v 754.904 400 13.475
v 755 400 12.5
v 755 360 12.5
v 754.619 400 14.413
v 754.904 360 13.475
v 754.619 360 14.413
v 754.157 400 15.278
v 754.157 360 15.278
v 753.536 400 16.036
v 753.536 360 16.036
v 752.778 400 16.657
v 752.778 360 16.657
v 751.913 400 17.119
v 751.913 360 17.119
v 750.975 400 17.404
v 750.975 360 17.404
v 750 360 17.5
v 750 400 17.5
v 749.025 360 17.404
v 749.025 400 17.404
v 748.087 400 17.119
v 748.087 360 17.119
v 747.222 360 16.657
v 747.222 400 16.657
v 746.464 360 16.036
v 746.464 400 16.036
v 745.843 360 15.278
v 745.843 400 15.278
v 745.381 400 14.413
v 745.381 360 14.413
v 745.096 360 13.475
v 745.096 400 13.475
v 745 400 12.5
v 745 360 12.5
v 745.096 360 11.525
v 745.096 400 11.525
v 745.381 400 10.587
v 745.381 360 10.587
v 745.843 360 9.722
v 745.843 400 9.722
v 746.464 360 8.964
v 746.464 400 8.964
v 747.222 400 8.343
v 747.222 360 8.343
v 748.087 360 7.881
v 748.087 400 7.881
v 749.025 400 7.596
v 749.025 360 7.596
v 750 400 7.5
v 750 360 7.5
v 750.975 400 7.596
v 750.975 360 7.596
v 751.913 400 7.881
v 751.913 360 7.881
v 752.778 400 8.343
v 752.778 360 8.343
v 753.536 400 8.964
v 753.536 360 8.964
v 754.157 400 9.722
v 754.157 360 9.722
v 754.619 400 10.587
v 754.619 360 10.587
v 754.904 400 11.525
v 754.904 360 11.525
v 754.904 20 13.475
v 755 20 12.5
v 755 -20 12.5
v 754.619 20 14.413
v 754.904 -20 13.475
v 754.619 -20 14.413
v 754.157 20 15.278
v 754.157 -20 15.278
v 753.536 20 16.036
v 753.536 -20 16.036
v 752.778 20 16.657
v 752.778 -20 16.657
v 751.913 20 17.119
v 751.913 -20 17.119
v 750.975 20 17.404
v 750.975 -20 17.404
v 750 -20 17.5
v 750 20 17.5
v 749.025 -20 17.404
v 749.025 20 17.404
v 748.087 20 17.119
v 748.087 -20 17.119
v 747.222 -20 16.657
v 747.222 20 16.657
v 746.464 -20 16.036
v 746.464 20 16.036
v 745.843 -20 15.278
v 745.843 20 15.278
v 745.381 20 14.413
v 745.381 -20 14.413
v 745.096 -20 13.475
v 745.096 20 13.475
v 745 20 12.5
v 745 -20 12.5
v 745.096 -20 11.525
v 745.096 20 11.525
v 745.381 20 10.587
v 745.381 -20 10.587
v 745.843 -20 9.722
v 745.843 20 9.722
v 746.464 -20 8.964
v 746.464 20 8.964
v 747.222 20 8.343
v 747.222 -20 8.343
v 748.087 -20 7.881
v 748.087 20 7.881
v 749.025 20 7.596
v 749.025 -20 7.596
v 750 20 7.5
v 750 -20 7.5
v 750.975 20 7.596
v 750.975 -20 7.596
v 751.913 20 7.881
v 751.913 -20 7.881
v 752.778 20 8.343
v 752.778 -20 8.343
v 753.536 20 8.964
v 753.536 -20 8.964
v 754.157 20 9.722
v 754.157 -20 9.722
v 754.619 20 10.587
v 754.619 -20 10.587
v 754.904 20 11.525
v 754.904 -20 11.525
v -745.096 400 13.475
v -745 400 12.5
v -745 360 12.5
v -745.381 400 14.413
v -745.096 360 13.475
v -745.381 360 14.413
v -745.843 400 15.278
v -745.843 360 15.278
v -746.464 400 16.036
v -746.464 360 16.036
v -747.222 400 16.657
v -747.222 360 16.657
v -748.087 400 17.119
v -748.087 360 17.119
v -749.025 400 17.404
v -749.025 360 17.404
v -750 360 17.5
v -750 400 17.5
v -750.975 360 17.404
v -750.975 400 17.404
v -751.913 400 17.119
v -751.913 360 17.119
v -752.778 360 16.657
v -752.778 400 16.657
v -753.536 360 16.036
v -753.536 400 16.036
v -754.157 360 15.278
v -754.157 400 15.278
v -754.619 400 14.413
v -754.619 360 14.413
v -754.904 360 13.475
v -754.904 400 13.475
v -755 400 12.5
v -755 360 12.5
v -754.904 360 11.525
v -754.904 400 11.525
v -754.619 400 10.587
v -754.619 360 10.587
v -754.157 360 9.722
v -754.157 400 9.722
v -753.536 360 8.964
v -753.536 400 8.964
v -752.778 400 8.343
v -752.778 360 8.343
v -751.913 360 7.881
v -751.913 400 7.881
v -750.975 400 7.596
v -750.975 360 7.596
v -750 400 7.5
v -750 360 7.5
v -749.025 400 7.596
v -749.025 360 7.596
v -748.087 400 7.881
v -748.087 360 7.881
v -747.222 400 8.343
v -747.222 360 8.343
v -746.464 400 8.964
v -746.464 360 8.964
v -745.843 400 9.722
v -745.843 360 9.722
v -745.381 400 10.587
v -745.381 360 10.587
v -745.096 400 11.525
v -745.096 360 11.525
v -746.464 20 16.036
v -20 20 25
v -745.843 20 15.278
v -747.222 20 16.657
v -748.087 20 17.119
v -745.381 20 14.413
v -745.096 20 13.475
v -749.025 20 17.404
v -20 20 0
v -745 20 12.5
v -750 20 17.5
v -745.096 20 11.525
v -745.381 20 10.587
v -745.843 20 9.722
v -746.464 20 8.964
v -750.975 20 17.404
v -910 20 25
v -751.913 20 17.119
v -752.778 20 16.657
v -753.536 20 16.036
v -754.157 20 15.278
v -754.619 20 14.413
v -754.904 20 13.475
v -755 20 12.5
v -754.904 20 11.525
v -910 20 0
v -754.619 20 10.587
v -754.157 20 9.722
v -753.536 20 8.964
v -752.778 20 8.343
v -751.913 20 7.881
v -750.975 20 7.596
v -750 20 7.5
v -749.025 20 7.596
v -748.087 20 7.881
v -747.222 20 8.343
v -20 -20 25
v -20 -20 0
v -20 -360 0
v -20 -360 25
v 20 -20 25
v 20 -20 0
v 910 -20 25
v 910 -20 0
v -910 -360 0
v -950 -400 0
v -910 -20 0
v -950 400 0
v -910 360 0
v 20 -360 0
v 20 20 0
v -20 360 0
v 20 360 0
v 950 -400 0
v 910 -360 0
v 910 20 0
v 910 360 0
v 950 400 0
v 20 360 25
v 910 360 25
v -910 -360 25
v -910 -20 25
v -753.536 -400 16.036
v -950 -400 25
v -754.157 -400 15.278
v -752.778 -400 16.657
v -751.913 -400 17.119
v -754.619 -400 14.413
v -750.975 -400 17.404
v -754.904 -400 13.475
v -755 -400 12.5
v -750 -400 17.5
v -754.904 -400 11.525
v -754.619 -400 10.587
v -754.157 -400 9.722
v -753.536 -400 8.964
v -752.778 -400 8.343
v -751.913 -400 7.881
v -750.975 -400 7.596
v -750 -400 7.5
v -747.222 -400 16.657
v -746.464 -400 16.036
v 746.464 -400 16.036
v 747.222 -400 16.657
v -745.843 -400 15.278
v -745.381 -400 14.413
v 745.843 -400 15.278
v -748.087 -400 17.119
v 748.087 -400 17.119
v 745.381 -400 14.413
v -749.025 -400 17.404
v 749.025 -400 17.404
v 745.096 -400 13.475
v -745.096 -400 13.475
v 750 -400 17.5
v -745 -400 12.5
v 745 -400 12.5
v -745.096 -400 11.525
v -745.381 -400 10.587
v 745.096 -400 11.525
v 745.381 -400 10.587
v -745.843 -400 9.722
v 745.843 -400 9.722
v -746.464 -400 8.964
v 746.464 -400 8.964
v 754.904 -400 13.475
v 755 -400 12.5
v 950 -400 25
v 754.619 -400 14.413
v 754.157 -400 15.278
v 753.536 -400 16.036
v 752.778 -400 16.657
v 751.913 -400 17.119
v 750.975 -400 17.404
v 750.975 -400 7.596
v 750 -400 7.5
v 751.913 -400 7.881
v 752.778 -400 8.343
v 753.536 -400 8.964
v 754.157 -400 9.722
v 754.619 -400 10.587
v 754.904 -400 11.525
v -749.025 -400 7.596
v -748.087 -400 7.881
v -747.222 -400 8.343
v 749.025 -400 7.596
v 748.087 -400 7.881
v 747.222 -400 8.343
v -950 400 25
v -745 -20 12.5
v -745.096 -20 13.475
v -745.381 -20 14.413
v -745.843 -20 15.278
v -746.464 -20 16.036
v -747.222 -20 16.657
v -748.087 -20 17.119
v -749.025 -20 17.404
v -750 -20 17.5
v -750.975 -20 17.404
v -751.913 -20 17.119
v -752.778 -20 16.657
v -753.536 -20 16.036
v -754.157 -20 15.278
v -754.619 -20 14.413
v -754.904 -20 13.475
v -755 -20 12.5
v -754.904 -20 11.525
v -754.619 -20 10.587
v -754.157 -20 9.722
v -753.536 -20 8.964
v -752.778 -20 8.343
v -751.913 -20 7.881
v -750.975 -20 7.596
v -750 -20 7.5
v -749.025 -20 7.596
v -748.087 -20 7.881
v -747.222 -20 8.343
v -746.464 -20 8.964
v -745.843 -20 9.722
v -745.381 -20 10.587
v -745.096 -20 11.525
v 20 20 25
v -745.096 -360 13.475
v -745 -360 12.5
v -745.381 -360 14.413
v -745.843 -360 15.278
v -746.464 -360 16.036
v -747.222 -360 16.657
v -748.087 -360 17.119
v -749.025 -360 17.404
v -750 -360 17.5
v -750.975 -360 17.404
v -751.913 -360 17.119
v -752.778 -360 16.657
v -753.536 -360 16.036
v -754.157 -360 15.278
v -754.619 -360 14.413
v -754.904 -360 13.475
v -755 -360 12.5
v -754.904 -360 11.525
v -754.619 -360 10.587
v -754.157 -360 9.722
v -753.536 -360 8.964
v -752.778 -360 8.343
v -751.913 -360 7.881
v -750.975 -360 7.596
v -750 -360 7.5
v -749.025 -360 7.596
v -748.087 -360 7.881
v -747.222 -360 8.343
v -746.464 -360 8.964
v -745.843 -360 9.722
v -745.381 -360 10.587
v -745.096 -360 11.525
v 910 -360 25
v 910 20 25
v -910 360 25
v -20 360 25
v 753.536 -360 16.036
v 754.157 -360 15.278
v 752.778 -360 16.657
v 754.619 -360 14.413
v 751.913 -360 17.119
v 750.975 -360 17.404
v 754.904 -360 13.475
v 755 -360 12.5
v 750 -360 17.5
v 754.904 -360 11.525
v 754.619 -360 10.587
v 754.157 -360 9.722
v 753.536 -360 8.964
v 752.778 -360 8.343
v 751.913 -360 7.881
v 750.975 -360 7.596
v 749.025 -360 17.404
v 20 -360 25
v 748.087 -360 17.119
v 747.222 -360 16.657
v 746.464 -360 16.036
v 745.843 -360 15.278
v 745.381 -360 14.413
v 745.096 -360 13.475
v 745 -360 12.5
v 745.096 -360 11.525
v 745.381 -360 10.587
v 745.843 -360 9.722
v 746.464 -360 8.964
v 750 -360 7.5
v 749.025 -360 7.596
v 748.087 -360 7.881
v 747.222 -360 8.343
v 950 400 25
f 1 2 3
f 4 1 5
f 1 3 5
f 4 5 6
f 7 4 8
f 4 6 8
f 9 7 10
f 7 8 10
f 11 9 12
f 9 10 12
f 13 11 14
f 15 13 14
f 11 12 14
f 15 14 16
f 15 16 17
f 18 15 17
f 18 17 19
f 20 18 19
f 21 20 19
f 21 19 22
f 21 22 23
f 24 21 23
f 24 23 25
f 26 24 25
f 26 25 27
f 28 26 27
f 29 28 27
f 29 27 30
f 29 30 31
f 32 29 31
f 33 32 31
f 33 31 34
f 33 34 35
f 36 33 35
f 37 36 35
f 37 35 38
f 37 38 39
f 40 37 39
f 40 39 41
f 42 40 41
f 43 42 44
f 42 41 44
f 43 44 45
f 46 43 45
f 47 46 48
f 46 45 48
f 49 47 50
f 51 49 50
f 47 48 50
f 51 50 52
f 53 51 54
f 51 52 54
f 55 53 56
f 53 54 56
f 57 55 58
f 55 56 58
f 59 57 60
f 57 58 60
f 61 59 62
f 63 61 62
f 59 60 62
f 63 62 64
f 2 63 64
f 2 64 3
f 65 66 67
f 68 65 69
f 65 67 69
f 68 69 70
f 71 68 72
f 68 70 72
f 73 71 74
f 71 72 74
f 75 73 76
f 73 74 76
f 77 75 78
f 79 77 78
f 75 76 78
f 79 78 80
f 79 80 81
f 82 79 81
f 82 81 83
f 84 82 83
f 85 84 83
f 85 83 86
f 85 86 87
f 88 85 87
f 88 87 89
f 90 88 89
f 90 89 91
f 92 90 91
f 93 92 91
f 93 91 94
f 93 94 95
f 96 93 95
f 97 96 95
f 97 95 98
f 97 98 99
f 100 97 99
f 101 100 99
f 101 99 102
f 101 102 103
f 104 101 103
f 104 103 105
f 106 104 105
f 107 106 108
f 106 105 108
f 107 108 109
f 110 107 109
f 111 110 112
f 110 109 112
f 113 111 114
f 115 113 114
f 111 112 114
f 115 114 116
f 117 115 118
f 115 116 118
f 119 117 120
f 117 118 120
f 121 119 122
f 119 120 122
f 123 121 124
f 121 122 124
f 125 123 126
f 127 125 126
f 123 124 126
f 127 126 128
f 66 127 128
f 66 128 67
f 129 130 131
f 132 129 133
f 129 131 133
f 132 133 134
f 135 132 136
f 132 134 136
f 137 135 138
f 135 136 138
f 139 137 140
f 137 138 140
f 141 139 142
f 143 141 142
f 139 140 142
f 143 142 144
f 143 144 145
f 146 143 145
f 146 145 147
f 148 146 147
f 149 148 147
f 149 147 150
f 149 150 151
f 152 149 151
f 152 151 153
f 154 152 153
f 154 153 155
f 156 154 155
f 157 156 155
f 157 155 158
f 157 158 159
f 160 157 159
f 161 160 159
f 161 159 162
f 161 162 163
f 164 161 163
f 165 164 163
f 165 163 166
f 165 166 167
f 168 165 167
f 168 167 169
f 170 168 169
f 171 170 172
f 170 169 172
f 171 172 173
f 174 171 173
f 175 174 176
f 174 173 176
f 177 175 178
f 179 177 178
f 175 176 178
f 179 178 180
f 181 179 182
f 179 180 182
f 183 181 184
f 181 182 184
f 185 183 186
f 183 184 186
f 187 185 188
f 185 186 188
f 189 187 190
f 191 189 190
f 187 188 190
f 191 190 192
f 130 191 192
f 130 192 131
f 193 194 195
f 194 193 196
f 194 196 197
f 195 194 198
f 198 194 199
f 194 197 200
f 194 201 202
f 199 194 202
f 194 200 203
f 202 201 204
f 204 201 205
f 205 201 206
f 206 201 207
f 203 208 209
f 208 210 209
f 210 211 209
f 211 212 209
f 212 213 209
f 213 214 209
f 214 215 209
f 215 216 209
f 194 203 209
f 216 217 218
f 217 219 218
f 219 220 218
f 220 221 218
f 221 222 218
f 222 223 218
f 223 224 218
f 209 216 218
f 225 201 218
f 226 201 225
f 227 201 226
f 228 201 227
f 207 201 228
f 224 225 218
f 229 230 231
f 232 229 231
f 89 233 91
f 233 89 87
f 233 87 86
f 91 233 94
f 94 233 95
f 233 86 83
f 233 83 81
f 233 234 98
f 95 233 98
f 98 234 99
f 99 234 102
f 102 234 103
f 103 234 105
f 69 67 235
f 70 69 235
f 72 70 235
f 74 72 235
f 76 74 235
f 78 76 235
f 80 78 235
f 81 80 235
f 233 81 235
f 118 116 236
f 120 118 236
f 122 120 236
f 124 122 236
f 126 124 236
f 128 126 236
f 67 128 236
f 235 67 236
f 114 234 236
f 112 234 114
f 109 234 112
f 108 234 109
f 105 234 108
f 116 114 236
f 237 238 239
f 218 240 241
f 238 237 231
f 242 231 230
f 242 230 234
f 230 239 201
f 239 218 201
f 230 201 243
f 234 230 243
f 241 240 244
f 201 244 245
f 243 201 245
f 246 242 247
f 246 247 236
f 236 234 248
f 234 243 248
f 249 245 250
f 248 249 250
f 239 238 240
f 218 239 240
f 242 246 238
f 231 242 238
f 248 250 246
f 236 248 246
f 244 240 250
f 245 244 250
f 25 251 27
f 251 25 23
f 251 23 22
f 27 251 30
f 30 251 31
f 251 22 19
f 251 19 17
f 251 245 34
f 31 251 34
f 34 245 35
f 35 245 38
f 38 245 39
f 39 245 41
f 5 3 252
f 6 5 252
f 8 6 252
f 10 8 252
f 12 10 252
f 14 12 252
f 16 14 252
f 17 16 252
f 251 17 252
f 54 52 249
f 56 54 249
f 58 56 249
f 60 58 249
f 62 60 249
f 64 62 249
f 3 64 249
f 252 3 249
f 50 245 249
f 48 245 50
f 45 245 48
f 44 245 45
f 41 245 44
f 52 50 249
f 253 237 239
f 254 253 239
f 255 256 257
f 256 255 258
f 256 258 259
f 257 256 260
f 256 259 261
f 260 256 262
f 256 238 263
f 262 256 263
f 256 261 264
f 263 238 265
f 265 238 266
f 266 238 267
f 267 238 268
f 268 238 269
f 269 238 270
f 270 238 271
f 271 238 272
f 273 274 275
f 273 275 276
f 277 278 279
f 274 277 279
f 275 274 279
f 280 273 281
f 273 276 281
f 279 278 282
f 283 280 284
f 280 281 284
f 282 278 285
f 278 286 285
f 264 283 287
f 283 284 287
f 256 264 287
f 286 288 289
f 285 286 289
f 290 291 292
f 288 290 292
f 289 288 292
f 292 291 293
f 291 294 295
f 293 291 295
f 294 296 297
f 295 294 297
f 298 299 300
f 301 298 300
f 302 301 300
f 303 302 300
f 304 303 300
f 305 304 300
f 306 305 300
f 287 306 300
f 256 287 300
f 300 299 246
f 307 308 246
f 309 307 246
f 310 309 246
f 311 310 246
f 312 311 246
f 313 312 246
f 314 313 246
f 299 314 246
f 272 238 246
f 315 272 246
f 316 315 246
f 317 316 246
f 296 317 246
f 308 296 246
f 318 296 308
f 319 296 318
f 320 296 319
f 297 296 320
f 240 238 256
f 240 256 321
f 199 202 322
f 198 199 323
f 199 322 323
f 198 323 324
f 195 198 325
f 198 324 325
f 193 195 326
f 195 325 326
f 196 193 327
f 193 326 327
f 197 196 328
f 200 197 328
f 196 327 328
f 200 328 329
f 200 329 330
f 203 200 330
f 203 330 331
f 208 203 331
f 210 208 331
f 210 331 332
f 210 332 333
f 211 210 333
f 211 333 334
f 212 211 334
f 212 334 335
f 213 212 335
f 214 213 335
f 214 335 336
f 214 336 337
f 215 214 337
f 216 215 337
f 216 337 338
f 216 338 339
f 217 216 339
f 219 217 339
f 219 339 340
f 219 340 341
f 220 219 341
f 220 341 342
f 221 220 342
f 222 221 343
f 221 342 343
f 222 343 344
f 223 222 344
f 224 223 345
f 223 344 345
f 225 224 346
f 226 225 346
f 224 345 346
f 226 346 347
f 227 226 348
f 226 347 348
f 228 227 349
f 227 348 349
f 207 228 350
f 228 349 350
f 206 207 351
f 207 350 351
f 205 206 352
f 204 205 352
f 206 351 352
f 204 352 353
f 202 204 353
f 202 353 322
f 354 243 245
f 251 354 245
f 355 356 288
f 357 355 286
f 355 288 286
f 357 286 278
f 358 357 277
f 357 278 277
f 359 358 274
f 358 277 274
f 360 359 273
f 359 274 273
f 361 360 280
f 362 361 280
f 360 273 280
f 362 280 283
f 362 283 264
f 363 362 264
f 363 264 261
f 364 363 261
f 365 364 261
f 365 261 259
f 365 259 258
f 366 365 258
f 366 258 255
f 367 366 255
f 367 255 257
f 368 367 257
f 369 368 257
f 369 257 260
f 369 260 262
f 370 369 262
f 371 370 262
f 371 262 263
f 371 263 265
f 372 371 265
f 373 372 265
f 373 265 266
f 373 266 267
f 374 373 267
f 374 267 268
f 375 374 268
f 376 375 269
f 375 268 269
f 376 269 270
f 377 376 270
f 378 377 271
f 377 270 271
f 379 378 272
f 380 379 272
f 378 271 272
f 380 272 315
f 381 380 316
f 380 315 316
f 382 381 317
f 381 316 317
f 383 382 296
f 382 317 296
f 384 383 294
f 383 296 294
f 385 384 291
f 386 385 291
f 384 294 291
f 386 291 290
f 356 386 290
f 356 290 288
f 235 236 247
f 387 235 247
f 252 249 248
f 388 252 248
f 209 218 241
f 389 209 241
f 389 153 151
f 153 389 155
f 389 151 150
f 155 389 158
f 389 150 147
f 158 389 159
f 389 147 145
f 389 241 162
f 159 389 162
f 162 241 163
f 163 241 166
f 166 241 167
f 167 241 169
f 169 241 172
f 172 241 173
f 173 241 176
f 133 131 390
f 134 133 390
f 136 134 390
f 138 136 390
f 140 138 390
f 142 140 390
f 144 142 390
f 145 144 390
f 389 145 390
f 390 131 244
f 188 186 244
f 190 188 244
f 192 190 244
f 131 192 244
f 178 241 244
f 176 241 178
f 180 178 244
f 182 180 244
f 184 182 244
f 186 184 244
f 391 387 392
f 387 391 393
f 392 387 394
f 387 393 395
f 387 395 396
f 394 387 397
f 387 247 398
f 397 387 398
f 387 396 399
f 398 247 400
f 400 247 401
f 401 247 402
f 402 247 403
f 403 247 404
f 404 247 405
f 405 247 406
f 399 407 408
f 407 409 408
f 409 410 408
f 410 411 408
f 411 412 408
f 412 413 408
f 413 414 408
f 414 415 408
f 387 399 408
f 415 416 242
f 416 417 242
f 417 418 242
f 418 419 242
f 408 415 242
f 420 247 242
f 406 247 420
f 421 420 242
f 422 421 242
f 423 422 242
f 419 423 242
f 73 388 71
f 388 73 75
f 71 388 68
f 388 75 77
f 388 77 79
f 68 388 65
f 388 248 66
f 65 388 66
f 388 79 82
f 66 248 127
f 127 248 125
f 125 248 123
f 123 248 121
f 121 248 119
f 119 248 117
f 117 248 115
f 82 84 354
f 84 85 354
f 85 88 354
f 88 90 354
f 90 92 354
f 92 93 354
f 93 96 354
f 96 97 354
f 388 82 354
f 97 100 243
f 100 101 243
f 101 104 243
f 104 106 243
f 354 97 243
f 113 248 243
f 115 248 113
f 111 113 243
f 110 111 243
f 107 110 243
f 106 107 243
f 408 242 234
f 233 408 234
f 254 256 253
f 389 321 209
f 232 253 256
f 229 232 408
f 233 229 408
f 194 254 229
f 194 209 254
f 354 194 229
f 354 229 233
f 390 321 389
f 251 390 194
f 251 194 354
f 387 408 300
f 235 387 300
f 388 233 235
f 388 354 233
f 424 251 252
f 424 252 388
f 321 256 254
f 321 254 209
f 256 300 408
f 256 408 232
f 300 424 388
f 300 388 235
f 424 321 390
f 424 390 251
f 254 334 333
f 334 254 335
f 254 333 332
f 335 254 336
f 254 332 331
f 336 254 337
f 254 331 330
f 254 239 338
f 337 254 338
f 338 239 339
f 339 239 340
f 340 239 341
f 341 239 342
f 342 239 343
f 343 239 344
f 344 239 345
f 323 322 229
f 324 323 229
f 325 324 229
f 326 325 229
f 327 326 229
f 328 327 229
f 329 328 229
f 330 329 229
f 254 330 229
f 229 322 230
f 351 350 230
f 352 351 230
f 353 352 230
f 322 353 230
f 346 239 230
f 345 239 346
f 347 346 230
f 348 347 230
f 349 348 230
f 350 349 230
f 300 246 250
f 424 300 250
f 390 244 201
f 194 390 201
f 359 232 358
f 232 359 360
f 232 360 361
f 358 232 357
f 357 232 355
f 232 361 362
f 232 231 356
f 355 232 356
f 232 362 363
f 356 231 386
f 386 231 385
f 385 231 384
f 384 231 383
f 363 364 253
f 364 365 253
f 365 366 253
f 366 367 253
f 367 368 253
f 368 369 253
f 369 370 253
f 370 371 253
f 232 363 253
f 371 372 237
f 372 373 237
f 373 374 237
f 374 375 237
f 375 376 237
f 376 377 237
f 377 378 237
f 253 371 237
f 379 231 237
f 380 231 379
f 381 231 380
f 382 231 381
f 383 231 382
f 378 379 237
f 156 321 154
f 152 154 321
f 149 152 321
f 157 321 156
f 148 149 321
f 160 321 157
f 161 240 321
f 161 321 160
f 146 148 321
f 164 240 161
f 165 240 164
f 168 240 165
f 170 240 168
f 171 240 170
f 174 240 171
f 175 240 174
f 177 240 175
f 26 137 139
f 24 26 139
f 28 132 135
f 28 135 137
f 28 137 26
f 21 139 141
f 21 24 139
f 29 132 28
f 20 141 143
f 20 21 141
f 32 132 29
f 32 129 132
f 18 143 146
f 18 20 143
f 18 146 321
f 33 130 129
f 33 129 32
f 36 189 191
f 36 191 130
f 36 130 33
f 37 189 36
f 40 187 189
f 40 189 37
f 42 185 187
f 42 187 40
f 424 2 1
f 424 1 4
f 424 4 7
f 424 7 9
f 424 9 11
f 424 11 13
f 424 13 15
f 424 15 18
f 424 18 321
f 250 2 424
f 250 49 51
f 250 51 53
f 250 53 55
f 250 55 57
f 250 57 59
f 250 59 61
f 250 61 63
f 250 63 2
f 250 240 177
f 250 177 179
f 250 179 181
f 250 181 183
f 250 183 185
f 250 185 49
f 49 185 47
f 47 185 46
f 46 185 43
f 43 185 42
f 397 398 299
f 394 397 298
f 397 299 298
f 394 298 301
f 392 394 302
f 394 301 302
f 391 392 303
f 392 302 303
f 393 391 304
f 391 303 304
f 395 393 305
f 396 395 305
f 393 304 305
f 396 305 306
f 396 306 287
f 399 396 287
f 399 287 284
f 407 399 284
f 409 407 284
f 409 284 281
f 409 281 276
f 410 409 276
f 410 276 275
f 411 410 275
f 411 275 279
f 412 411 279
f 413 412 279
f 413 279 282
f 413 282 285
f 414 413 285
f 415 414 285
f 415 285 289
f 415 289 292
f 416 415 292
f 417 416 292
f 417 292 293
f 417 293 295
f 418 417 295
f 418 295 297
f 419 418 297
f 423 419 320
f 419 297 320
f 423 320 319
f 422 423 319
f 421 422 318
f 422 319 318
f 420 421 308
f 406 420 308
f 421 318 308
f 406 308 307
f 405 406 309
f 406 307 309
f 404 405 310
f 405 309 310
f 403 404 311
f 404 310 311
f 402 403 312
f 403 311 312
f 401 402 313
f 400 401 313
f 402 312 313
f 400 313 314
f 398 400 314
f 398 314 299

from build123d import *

# Parameters (mm, degrees)
F0_W     = 1900
F0_H     = 800
F1_DEPTH = 25
F2_R     = 5
F3_DEPTH = 800.001


with BuildPart() as f1:
    # F0 (on Top) → F1 (new body)
    with BuildSketch(Plane.XY):
        Rectangle(F0_W, F0_H)
        Polygon((20, 360), (910, 360), (910, 20), (910, -20), (910, -360), (20, -360), (-20, -360), (-910, -360), (-910, -20), (-910, 20), (-910, 360), (-20, 360), align=None, mode=Mode.SUBTRACT)
        Polygon((20, 20), (20, 360), (-20, 360), (-20, 20), (-910, 20), (-910, -20), (-20, -20), (-20, -360), (20, -360), (20, -20), (910, -20), (910, 20), align=None)
    extrude(amount=F1_DEPTH)

    # F2 (on face) → F3 (cut, through all)
    with BuildSketch(Plane.XZ.offset(400)):
        with Locations((750, 12.5)):
            Circle(F2_R)
        with Locations((-750, 12.5)):
            Circle(F2_R)
    extrude(amount=-F3_DEPTH, mode=Mode.SUBTRACT)


solid = f1.part
